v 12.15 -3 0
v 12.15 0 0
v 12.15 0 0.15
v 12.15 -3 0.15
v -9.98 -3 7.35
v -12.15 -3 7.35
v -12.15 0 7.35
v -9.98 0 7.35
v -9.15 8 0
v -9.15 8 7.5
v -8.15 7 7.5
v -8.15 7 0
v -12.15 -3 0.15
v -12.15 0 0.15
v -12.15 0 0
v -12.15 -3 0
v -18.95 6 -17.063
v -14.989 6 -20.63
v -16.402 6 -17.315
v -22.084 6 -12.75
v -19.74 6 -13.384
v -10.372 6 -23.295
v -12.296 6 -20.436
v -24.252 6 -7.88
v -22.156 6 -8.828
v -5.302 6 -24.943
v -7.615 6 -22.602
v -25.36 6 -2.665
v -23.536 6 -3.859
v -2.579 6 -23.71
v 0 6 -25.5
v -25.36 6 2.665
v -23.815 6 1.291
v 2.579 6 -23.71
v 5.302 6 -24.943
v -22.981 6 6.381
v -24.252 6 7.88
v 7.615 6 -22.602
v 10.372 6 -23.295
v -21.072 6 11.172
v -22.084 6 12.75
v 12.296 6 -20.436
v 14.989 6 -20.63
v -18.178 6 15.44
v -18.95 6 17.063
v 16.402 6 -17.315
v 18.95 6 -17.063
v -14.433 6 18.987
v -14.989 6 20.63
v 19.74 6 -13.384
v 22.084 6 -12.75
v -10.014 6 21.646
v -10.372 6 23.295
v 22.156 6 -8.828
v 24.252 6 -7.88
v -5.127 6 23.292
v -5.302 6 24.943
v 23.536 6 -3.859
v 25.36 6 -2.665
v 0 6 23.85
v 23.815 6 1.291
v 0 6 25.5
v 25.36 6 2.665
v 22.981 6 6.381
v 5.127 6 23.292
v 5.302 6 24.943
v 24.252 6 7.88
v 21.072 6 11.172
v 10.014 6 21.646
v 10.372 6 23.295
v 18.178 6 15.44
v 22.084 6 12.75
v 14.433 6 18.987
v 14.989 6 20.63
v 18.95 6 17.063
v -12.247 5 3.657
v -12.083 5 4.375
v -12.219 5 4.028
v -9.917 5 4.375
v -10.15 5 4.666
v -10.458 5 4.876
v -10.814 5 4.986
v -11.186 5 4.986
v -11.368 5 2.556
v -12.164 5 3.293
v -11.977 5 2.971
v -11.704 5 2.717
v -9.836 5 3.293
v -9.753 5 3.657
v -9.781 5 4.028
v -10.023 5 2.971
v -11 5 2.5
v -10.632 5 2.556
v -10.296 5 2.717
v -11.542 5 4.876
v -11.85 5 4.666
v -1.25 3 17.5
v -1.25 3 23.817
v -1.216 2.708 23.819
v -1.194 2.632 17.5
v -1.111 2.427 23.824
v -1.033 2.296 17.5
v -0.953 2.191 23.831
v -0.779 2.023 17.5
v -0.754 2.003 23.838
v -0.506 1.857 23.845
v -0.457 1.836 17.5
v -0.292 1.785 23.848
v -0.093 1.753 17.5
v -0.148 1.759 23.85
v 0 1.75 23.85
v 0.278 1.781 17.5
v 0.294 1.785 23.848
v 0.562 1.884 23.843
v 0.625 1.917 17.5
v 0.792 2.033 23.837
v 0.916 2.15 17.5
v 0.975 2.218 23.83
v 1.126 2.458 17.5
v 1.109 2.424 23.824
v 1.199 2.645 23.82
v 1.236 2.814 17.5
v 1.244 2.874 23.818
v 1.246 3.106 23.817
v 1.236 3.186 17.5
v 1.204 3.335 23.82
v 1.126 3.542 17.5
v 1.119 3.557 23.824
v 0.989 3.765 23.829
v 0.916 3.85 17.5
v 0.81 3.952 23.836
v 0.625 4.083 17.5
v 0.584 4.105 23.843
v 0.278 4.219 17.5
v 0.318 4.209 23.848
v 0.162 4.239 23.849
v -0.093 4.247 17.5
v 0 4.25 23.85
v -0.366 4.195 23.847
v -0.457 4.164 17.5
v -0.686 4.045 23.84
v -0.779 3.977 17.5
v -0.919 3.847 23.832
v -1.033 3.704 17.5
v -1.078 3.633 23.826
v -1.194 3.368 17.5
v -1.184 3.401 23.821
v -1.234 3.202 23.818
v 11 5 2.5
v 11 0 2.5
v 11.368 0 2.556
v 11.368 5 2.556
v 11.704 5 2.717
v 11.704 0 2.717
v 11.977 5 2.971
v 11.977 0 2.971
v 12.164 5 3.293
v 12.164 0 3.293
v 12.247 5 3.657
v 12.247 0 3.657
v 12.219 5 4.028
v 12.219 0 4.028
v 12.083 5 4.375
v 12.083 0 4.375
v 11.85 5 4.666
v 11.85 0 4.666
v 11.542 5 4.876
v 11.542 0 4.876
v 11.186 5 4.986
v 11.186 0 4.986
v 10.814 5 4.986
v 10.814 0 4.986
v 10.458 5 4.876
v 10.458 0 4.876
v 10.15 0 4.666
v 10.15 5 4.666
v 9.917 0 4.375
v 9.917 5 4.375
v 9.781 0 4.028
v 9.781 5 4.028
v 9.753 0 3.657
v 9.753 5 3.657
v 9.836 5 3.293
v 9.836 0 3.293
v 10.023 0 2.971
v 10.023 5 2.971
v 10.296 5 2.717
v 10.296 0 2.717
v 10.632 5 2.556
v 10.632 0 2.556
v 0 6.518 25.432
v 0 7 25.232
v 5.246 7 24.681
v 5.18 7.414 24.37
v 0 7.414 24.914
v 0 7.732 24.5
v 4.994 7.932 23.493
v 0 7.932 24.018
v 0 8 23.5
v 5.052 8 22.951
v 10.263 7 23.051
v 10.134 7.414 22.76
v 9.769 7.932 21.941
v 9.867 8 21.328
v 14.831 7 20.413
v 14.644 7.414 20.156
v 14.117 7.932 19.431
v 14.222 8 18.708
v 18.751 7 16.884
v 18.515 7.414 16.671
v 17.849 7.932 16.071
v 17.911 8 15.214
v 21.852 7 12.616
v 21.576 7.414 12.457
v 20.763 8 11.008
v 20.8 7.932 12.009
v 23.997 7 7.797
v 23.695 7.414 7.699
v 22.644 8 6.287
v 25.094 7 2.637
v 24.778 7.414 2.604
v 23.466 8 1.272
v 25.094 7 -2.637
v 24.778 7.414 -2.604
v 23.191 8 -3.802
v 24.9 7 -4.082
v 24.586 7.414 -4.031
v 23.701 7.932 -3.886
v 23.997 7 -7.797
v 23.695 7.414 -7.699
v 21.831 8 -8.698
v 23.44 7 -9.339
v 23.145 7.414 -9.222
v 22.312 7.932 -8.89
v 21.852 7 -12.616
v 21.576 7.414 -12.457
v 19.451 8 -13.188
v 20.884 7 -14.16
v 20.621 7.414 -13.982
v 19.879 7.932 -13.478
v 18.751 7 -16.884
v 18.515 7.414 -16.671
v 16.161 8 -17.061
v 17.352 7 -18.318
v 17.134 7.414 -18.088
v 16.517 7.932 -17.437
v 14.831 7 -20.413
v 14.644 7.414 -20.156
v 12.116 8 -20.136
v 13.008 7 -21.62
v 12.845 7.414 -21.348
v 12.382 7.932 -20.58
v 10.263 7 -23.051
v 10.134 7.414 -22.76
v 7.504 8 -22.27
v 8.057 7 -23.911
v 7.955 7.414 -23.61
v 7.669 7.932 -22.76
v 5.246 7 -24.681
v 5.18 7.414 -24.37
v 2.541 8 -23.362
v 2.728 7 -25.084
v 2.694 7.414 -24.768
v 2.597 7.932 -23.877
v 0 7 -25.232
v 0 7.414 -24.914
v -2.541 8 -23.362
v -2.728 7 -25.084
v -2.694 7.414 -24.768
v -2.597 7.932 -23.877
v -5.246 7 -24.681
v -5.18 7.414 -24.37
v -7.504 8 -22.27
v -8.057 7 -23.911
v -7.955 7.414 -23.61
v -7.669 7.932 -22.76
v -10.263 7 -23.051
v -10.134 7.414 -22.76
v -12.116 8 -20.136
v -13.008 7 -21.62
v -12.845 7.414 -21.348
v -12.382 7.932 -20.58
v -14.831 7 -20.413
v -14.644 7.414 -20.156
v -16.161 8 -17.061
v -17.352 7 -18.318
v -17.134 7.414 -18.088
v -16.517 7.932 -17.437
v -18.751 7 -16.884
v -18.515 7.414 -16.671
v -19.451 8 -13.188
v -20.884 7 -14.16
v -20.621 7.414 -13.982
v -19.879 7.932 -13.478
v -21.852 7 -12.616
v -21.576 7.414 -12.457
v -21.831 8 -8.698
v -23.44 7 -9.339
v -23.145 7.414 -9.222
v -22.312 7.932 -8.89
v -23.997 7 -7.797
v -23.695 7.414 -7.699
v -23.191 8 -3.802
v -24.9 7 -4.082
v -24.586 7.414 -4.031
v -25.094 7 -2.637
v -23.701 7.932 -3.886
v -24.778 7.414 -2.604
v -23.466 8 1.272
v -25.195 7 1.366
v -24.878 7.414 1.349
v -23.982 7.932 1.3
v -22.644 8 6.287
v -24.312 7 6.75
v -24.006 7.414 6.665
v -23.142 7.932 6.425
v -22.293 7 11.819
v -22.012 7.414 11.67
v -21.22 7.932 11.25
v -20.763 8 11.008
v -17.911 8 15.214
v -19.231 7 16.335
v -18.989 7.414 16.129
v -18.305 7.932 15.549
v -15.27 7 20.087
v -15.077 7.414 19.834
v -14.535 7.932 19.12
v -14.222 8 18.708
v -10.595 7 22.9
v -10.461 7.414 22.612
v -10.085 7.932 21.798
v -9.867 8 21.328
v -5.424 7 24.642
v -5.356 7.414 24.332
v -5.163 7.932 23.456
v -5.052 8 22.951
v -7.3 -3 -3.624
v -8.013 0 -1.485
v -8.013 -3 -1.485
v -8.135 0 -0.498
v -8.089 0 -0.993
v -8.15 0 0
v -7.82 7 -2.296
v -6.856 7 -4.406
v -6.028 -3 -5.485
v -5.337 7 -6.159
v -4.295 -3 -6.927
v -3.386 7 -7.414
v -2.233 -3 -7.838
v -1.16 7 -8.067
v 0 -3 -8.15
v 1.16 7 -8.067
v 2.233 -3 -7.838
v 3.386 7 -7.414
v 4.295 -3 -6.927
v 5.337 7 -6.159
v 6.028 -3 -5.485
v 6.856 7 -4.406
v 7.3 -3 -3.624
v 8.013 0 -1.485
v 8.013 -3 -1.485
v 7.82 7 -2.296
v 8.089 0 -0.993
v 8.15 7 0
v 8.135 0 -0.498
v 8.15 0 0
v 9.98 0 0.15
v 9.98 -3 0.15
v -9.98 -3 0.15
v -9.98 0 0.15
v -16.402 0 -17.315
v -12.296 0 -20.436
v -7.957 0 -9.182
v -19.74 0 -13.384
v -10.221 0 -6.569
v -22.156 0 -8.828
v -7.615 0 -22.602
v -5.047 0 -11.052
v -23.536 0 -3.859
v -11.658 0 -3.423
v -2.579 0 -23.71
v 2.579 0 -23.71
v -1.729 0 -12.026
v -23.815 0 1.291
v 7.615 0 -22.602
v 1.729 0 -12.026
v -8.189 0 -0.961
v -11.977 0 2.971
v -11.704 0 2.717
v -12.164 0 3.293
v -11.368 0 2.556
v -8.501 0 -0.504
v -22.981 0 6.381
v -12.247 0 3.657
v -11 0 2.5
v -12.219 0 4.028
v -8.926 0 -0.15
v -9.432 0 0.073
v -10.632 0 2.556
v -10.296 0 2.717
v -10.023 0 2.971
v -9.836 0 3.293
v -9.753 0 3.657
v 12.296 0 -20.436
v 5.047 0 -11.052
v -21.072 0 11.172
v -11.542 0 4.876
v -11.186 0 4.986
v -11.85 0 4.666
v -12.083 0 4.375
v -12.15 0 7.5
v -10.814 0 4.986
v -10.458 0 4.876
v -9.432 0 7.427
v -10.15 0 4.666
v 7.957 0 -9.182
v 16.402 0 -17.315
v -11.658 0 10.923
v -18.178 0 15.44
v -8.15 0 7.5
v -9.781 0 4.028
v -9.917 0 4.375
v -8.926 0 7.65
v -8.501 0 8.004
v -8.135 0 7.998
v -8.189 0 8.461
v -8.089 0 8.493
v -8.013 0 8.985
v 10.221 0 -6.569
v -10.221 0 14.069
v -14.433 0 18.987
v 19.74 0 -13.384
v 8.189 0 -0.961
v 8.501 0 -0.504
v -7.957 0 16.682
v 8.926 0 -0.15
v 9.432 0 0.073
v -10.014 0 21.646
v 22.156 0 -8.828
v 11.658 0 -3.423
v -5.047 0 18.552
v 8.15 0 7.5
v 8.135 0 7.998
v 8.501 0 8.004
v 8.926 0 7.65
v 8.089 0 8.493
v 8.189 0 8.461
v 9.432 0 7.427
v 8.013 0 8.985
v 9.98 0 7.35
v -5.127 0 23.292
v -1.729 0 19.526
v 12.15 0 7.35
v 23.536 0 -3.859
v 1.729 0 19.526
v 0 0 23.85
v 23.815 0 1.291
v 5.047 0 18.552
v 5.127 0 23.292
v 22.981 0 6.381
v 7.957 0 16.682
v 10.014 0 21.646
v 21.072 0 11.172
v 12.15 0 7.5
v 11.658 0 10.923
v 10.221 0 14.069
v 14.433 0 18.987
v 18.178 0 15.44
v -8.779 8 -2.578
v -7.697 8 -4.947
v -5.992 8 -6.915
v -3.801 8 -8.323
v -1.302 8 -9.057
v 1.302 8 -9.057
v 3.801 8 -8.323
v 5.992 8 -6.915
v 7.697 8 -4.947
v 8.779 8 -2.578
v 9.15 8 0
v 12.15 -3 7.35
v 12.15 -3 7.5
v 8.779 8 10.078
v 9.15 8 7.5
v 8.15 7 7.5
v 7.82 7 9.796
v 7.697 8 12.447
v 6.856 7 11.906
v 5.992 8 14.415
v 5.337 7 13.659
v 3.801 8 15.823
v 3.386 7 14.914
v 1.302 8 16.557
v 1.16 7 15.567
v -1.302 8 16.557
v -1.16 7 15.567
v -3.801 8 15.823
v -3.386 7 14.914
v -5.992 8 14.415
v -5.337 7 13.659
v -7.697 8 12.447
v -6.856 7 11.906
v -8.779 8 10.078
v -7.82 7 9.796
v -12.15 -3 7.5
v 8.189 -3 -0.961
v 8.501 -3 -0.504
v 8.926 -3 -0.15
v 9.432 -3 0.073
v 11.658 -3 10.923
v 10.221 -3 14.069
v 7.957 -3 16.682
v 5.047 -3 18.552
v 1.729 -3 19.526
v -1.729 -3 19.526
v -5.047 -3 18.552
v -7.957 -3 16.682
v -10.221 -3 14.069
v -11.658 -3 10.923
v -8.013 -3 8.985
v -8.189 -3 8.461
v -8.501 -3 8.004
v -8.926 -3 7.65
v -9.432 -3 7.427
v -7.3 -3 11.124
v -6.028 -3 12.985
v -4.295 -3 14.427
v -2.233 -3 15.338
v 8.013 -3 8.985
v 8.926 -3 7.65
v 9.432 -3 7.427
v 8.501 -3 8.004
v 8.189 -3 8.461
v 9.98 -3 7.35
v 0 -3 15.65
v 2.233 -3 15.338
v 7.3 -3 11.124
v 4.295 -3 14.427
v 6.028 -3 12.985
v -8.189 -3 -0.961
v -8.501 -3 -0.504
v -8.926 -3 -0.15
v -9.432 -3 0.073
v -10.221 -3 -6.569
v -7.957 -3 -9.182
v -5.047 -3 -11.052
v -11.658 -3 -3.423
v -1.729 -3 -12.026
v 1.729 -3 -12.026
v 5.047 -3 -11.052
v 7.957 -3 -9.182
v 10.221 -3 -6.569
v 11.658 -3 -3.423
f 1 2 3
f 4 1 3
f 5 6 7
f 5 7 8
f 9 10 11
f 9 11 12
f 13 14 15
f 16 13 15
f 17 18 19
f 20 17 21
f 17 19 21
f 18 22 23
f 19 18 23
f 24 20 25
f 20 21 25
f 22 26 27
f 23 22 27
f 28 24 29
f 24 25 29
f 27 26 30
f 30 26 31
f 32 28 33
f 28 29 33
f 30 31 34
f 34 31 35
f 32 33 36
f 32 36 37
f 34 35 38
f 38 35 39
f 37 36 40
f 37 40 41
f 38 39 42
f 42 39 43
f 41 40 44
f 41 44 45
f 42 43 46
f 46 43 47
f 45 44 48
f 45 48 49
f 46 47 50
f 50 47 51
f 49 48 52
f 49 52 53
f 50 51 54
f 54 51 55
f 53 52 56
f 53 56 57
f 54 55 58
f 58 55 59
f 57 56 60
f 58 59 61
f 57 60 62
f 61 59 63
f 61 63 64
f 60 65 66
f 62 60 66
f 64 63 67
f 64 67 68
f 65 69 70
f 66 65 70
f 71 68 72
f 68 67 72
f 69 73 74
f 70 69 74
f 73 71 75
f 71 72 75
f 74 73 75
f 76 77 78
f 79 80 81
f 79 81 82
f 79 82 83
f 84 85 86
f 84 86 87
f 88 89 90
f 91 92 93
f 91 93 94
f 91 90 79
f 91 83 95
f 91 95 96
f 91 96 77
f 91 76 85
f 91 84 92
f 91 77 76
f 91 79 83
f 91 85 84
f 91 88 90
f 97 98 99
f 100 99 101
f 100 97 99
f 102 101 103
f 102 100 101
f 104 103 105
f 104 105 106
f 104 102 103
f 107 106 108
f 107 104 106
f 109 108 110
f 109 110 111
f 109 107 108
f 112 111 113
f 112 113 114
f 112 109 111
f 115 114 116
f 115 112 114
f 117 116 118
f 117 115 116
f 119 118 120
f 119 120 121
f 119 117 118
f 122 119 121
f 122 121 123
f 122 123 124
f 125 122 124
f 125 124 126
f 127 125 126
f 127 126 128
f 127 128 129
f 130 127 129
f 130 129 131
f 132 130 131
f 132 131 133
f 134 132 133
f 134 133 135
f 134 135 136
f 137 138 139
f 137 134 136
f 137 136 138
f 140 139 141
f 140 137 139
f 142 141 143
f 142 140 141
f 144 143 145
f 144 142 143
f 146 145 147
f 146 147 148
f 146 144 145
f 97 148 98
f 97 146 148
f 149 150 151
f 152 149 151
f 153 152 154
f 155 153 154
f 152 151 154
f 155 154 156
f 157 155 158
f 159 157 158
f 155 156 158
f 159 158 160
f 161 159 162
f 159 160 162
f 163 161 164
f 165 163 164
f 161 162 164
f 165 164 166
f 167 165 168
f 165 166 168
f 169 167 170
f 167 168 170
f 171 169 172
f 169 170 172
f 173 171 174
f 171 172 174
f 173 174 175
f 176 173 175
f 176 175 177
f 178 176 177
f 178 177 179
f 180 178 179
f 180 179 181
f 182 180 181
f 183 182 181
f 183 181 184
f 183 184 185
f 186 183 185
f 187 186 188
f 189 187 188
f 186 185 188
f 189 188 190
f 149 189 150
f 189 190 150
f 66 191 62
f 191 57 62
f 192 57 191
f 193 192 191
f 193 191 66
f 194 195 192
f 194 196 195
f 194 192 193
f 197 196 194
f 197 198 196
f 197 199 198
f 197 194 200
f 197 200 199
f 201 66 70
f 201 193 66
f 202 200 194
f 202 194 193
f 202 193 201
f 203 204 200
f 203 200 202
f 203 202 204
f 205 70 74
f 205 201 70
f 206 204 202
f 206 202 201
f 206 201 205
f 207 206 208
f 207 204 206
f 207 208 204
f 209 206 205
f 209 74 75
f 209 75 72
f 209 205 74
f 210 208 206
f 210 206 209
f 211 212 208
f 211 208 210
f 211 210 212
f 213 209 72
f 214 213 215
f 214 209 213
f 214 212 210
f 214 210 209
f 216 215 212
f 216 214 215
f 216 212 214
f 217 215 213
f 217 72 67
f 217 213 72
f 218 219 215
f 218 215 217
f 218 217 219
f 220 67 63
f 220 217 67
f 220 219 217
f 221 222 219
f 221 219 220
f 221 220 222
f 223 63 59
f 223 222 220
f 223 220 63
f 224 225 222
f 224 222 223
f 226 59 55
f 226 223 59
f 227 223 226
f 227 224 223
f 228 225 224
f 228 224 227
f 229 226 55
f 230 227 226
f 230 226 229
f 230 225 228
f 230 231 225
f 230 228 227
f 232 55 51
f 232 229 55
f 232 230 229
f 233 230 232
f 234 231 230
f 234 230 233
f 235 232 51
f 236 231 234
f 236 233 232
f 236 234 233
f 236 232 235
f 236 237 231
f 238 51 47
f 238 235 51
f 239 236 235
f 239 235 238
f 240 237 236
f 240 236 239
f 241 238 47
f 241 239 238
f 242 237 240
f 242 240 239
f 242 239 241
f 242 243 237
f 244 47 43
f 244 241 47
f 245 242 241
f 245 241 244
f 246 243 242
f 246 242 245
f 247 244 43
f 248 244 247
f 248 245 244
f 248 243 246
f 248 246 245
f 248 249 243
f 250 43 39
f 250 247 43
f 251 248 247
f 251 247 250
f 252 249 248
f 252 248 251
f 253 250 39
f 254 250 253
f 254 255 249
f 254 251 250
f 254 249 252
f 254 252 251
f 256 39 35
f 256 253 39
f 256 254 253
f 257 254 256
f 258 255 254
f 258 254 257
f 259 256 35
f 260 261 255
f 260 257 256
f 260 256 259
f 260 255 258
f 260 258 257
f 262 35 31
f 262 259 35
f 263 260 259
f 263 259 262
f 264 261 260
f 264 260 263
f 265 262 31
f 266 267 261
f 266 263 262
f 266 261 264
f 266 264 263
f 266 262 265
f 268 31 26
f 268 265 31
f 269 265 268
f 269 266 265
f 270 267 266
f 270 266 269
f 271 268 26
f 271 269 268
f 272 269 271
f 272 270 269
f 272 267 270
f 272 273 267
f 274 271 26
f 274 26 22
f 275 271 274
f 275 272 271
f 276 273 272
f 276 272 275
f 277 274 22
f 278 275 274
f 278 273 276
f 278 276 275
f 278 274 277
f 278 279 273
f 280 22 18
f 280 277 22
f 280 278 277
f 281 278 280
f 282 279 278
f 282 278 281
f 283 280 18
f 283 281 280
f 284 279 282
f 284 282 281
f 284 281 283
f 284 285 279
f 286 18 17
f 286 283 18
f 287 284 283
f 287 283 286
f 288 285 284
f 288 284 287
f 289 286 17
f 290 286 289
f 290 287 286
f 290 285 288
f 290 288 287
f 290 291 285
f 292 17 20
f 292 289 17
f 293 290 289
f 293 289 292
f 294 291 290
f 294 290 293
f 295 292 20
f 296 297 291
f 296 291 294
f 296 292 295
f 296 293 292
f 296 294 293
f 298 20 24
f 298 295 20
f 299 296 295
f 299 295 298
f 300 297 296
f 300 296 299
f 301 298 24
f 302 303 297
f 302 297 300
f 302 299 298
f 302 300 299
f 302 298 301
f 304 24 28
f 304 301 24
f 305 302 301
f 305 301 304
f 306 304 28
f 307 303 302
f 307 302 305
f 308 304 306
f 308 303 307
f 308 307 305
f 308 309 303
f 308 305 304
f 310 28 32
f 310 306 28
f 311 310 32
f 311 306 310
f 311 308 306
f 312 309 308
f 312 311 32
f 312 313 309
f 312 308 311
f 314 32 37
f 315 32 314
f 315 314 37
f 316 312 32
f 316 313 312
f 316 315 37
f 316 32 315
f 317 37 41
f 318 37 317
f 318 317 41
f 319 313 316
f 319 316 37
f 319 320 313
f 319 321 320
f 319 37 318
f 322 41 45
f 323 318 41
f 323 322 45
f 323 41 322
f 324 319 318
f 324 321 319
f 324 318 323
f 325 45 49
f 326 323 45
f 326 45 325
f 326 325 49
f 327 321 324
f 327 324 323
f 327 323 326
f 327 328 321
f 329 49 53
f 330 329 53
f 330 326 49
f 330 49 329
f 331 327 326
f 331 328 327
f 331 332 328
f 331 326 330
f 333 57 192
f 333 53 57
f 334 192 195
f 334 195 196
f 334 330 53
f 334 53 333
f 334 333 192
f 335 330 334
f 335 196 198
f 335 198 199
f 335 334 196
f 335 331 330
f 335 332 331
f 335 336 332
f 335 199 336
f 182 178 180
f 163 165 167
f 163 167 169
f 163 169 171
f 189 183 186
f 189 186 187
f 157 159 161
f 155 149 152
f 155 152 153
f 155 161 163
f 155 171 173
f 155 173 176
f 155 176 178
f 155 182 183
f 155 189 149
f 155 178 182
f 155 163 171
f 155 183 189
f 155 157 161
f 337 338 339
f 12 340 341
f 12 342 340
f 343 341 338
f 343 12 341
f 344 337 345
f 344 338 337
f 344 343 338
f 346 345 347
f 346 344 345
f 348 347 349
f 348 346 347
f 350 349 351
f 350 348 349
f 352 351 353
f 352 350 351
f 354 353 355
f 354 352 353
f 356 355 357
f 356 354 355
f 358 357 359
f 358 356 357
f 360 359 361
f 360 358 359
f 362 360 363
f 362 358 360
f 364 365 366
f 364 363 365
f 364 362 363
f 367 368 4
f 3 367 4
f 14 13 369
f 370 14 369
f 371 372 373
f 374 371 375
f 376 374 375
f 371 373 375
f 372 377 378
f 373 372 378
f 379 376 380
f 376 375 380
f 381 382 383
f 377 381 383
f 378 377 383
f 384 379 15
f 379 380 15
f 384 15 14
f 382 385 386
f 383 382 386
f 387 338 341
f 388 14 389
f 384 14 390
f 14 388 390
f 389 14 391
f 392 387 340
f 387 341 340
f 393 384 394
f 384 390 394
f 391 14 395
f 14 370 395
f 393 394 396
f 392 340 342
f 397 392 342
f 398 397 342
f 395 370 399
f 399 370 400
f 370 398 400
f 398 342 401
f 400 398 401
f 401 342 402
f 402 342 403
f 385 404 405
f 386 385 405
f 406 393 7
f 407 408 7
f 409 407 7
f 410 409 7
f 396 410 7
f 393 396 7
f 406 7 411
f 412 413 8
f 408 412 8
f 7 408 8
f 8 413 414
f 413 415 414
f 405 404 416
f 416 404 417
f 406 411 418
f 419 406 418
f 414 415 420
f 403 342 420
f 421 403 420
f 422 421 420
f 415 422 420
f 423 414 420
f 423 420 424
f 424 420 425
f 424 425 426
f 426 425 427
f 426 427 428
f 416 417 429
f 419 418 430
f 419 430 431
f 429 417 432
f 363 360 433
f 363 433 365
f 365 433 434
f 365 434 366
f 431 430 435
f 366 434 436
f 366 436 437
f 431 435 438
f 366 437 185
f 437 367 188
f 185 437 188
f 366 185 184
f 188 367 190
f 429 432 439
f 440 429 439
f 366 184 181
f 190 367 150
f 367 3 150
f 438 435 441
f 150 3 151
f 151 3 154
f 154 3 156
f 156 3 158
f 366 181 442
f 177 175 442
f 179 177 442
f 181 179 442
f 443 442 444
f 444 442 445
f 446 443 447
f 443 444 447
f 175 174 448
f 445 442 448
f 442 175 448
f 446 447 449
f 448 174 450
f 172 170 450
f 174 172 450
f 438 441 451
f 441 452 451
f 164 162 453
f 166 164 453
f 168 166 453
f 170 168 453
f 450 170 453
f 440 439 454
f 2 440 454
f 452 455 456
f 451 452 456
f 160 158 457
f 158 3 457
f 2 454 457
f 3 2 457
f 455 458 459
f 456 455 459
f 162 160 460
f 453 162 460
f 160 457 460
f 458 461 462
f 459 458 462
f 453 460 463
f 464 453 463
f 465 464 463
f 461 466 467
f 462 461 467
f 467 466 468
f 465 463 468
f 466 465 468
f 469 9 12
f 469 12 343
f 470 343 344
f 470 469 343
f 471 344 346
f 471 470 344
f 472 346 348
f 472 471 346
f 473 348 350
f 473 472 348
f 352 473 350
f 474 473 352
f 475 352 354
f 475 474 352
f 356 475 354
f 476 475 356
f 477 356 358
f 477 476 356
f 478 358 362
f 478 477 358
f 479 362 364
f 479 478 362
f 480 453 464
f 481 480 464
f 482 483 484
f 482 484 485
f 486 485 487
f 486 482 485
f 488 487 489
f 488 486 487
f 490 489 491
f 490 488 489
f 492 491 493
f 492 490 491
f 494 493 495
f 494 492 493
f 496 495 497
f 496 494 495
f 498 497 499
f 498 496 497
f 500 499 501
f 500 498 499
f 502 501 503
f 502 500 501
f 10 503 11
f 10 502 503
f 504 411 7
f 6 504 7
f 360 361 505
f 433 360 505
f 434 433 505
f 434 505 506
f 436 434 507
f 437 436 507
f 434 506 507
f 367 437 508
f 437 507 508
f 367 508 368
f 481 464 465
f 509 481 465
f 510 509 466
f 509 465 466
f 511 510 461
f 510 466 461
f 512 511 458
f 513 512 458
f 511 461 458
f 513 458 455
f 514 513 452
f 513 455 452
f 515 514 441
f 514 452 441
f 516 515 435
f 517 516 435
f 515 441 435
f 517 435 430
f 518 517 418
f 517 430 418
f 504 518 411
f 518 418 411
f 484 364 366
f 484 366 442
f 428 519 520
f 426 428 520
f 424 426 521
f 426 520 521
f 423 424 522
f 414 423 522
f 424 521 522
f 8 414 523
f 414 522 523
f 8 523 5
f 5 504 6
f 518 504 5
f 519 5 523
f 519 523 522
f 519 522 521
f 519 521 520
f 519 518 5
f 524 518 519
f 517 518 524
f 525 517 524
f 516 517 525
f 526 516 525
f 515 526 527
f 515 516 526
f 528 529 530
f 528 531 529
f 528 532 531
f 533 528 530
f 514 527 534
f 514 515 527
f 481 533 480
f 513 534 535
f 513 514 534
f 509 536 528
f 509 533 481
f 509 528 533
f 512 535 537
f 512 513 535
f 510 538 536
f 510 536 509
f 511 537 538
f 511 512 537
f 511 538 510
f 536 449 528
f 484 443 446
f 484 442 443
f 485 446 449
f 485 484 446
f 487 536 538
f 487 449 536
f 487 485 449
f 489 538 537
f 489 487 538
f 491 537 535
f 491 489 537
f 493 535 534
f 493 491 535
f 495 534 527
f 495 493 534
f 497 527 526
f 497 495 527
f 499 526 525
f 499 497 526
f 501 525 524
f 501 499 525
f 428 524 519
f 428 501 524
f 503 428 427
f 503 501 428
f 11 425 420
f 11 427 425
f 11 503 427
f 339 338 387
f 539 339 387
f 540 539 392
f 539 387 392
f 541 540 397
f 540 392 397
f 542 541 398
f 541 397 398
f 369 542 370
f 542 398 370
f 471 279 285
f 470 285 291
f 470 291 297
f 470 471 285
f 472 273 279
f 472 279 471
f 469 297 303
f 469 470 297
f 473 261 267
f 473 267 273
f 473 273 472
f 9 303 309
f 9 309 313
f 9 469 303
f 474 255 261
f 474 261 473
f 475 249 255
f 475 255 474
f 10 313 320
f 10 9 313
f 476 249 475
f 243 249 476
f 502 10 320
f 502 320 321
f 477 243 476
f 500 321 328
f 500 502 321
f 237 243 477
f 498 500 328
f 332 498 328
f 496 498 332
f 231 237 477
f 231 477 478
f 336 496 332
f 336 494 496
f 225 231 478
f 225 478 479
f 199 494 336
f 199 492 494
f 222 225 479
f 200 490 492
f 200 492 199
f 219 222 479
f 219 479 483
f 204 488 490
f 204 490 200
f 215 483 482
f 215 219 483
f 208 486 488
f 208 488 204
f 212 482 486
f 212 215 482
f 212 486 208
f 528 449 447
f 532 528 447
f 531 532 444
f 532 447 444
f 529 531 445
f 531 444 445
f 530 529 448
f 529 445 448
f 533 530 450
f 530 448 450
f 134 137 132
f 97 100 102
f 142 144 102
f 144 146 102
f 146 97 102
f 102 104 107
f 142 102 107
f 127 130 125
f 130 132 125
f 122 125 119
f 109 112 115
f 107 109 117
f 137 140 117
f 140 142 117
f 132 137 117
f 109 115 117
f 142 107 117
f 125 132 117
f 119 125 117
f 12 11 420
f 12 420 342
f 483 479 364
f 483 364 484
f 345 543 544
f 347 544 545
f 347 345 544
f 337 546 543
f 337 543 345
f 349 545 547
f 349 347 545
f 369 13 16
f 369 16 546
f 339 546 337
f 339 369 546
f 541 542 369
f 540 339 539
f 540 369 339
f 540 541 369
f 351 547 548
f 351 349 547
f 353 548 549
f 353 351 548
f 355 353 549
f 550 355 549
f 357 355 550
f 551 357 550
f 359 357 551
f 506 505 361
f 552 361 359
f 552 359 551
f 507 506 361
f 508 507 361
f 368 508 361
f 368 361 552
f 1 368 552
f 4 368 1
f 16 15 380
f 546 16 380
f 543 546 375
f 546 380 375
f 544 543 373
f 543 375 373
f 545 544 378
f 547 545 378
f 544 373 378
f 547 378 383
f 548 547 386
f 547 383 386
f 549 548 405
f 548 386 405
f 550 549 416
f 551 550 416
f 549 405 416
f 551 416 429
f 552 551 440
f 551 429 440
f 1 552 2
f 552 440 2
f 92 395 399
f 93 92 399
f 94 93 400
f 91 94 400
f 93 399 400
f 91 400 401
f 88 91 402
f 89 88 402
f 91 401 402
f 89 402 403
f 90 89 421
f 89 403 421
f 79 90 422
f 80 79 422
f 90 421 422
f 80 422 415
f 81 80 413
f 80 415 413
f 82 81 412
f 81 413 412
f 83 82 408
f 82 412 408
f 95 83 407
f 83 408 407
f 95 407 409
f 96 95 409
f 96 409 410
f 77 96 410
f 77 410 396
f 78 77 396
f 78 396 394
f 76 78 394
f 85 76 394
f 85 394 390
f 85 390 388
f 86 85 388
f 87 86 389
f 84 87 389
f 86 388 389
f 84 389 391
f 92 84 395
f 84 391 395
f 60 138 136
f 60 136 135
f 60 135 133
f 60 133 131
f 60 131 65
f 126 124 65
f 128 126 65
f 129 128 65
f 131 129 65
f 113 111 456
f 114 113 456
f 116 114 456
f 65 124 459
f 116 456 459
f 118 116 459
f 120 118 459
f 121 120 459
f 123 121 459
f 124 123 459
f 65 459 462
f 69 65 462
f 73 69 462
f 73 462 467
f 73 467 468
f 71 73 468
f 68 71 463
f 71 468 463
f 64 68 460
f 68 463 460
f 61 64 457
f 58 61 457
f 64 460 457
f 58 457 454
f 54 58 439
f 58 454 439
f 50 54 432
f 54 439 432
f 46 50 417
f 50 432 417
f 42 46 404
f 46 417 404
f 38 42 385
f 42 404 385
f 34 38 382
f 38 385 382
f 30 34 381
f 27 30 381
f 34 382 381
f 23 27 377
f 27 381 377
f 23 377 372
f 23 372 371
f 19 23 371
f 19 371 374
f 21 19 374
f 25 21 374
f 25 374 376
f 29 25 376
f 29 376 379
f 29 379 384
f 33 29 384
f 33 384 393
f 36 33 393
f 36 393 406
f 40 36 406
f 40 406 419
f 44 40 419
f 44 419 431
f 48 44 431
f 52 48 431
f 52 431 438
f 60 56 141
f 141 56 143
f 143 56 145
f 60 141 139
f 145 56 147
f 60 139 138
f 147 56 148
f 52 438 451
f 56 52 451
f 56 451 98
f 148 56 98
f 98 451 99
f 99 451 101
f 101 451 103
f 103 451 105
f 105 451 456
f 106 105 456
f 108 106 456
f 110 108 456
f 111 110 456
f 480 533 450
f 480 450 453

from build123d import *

# Parameters (mm, degrees)
SKETCH1_R           = 23.85
BOSS_EXTRUDE1_DEPTH = 6
SKETCH2_R           = 25.5
BOSS_EXTRUDE2_DEPTH = 2
FILLET1_R           = 2
CUT_EXTRUDE1_DEPTH  = 37.939139135
BOSS_EXTRUDE3_DEPTH = 3
SKETCH5_W           = 28
SKETCH5_H           = 7.2
CUT_EXTRUDE2_DEPTH  = 3
SKETCH6_R           = 1.25
CUT_EXTRUDE3_DEPTH  = 5
FILLET2_R           = 2
CHAMFER1_SIZE       = 1
SKETCH7_W           = 1.25
SKETCH7_H           = 8


# Some blends are built 0.0001 mm under size
with BuildPart() as part:
    # Sketch1 → Boss-Extrude1 (new body)
    with BuildSketch(Plane(origin=(0, 0, 0), x_dir=(1, 0, 0), z_dir=(0, 1, 0))):
        with Locations(Location((0, 0, 0), (0, 0, 270))):
            Circle(SKETCH1_R)
    extrude(amount=BOSS_EXTRUDE1_DEPTH)

    # Sketch2 → Boss-Extrude2 (add)
    with BuildSketch(Plane(origin=(0, 6, 0), x_dir=(1, 0, 0), z_dir=(0, 1, 0))):
        with Locations(Location((0, 0, 0), (0, 0, 270))):
            Circle(SKETCH2_R)
    extrude(amount=BOSS_EXTRUDE2_DEPTH)

    # Fillet1
    fillet1_edges = [part.edges().sort_by_distance(p)[0] for p in [
        (0, 8, -25.5),
    ]]
    fillet(fillet1_edges, radius=FILLET1_R - 0.0001)  # a hair under: the kernel refuses the full size

    # Sketch3 → Cut-Extrude1 (cut, through all)
    with BuildSketch(Plane(origin=(0, 8, 0), x_dir=(1, 0, 0), z_dir=(0, 1, 0))):
        with BuildLine():
            Line((8.15, 0), (8.15, -7.5))
            ThreePointArc((8.15, -7.5), (0, -15.65), (-8.15, -7.5))
            Line((-8.15, -7.5), (-8.15, 0))
            ThreePointArc((-8.15, 0), (0, 8.15), (8.15, 0))
        make_face()
    extrude(amount=-CUT_EXTRUDE1_DEPTH, mode=Mode.SUBTRACT)

    # Sketch4 → Boss-Extrude3 (add)
    with BuildSketch(Plane.XZ):
        with BuildLine():
            Line((-12.15, 7.5), (-12.15, 0))
            ThreePointArc((-12.15, 0), (0, -12.15), (12.15, 0))
            Line((12.15, 0), (12.15, 7.5))
            ThreePointArc((12.15, 7.5), (0, 19.65), (-12.15, 7.5))
        make_face()
        with BuildLine():
            Line((8.15, 0), (8.15, 7.5))
            ThreePointArc((8.15, 7.5), (0, 15.65), (-8.15, 7.5))
            Line((-8.15, 7.5), (-8.15, 0))
            ThreePointArc((-8.15, 0), (0, -8.15), (8.15, 0))
        make_face(mode=Mode.SUBTRACT)
    extrude(amount=BOSS_EXTRUDE3_DEPTH)

    # Sketch5 → Cut-Extrude2 (cut)
    with BuildSketch(Plane.XZ.offset(3)):
        with Locations((0, 3.75)):
            Rectangle(SKETCH5_W, SKETCH5_H)
    extrude(amount=-CUT_EXTRUDE2_DEPTH, mode=Mode.SUBTRACT)

    # Sketch6 → Cut-Extrude3 (cut)
    with BuildSketch(Plane.XZ):
        with Locations(Location((-11, 3.75, 0), (0, 0, 270))):
            Circle(SKETCH6_R)
        with Locations(Location((11, 3.75, 0), (0, 0, 270))):
            Circle(SKETCH6_R)
    extrude(amount=-CUT_EXTRUDE3_DEPTH, mode=Mode.SUBTRACT)

    # Fillet2
    # the kernel refuses this fillet: 2 mm, written as the material it takes off along each edge
    with BuildSketch(Plane(origin=(8.15, -7.5749499, 0.15), x_dir=(-0.08318438898072168, 0, -0.9965341727356388), z_dir=(0, 1, 0)), Plane(origin=(8.15, 0, 7.35), x_dir=(-0.08318438898072168, 0, 0.9965341727356388), z_dir=(0, -1, 0)), Plane(origin=(-8.15, 0, 0.15), x_dir=(0.08318438898072168, 0, -0.9965341727356388), z_dir=(0, -1, 0)), Plane(origin=(-8.15, -7.5749499, 7.35), x_dir=(0.08318438898072159, 0, 0.9965341727356388), z_dir=(0, 1, 0))) as fillet2_piece_1:
        with BuildLine():
            CenterArc((1.840842581, -1.990006343), FILLET2_R, 95.730148145, 79.498223624)
            Line((-0.152225765, -1.823637565), (-0.351532599, -1.807000688))
            Line((-0.351532599, -1.807000688), (-0.199306835, 0.016636878))
            Line((-0.199306835, 0.016636878), (0.016636878, 0.199306835))
            ThreePointArc((0.016636878, 0.199306835), (0.166117004, 0.186829176), (1.62118728, 0.199000634))
            Line((1.62118728, 0.199000634), (1.641155943, 0))
        make_face()
    extrude(amount=7.5749499, mode=Mode.SUBTRACT)

    # Chamfer1
    chamfer1_edges = [part.edges().sort_by_distance(p)[0] for p in [
        (0, 8, -8.15),
        (-8.15, 8, 3.75),
        (0, 8, 15.65),
        (8.15, 8, 3.75),
    ]]
    chamfer(chamfer1_edges, length=CHAMFER1_SIZE)

    # Sketch7 → Cut-Revolve1 (revolve, cut)
    with BuildSketch(Plane(origin=(0, 3, 0), x_dir=(-1, 0, 0), z_dir=(0, -1, 0))):
        with Locations((0.625, -21.5)):
            Rectangle(SKETCH7_W, SKETCH7_H)
    revolve(axis=Axis((0, 3, 0), (0, 0, 1)), mode=Mode.SUBTRACT)


solid = part.part
